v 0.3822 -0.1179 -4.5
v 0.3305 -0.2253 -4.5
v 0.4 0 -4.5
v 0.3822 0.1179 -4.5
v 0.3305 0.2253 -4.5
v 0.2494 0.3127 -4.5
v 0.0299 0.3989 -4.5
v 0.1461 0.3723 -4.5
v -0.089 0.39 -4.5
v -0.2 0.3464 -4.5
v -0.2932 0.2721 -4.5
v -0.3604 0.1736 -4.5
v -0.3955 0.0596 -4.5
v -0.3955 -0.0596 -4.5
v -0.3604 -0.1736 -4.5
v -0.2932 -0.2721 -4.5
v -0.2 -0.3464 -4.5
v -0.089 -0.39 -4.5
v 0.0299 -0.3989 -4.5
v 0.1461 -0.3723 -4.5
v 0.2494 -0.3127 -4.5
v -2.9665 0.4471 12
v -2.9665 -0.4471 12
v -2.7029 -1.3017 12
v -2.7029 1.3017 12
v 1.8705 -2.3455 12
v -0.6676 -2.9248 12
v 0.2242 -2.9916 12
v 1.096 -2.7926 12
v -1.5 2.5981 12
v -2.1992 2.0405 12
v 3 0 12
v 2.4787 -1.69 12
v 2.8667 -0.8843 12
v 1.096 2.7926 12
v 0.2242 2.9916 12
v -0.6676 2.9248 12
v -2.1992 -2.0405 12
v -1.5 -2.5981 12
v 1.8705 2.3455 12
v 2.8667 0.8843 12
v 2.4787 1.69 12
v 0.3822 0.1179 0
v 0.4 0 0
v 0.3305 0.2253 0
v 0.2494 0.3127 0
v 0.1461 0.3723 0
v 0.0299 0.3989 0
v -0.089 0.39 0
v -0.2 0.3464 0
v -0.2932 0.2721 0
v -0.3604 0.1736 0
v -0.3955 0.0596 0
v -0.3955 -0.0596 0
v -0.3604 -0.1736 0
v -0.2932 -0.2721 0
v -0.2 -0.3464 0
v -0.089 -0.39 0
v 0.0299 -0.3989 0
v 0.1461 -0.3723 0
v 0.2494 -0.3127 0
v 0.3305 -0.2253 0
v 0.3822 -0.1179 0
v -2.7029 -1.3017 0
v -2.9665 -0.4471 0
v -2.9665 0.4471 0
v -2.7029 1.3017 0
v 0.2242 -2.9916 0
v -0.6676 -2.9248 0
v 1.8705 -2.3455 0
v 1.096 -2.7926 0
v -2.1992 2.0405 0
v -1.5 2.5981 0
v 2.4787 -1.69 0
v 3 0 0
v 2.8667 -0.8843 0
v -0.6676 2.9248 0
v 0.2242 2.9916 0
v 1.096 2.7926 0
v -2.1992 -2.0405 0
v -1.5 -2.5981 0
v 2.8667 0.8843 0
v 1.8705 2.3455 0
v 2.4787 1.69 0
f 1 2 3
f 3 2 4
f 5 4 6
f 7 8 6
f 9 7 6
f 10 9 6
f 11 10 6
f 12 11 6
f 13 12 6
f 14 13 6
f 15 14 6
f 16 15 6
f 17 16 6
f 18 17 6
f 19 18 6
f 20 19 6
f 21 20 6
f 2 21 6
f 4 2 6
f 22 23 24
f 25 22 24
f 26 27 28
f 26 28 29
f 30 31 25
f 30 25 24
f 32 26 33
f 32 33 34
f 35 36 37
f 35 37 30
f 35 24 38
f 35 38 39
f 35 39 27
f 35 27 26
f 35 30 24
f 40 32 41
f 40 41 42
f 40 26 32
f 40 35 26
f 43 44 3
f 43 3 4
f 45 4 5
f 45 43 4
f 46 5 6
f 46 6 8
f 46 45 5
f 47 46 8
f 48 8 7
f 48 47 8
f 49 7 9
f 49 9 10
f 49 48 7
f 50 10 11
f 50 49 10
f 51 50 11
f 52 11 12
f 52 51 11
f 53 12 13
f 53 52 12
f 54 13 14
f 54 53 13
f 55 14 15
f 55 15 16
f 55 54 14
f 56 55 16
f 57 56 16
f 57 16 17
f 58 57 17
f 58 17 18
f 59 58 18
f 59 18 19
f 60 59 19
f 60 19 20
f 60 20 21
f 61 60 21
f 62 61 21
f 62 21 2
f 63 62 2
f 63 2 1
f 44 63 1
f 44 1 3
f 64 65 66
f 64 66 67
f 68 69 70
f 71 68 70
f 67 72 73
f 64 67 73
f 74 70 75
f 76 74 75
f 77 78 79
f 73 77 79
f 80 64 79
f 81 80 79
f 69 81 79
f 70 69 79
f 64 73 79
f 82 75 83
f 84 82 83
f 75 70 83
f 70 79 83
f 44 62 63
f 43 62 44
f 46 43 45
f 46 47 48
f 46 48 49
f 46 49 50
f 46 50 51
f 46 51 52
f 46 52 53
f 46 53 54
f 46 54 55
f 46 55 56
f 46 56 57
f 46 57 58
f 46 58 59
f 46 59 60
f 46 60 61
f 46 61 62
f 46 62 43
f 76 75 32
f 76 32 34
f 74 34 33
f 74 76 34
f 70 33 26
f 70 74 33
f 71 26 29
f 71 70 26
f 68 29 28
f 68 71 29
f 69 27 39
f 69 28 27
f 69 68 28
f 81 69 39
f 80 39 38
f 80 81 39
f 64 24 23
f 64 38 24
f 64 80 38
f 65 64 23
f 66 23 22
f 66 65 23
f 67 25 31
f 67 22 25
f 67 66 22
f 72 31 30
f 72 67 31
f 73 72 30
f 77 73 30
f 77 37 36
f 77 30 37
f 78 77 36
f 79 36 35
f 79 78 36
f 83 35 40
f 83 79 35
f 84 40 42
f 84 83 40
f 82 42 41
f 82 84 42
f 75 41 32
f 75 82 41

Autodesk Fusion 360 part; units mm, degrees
sketch "スケッチ1" plane through (0, 0, 0) normal (0, 0, 1) x (1, 0, 0)
  circle A0 centre (0, 0) radius 3
  circle A1 centre (0, 0) radius 0.4
  dimension "d1" = 6
  dimension "d7" = 0.8
extrude "押し出し1" add sketch "スケッチ1" along normal blind 12 contours A0 | A1 makes body 1
extrude "押し出し1'" add sketch "スケッチ1" against normal blind 4.5 separate body contours A1 makes body 2 in component "Component"
component "Component" placed x (1, 0, 0) y (0, 1, 0) z (0, 0, 1) at (0, 0, 0)
